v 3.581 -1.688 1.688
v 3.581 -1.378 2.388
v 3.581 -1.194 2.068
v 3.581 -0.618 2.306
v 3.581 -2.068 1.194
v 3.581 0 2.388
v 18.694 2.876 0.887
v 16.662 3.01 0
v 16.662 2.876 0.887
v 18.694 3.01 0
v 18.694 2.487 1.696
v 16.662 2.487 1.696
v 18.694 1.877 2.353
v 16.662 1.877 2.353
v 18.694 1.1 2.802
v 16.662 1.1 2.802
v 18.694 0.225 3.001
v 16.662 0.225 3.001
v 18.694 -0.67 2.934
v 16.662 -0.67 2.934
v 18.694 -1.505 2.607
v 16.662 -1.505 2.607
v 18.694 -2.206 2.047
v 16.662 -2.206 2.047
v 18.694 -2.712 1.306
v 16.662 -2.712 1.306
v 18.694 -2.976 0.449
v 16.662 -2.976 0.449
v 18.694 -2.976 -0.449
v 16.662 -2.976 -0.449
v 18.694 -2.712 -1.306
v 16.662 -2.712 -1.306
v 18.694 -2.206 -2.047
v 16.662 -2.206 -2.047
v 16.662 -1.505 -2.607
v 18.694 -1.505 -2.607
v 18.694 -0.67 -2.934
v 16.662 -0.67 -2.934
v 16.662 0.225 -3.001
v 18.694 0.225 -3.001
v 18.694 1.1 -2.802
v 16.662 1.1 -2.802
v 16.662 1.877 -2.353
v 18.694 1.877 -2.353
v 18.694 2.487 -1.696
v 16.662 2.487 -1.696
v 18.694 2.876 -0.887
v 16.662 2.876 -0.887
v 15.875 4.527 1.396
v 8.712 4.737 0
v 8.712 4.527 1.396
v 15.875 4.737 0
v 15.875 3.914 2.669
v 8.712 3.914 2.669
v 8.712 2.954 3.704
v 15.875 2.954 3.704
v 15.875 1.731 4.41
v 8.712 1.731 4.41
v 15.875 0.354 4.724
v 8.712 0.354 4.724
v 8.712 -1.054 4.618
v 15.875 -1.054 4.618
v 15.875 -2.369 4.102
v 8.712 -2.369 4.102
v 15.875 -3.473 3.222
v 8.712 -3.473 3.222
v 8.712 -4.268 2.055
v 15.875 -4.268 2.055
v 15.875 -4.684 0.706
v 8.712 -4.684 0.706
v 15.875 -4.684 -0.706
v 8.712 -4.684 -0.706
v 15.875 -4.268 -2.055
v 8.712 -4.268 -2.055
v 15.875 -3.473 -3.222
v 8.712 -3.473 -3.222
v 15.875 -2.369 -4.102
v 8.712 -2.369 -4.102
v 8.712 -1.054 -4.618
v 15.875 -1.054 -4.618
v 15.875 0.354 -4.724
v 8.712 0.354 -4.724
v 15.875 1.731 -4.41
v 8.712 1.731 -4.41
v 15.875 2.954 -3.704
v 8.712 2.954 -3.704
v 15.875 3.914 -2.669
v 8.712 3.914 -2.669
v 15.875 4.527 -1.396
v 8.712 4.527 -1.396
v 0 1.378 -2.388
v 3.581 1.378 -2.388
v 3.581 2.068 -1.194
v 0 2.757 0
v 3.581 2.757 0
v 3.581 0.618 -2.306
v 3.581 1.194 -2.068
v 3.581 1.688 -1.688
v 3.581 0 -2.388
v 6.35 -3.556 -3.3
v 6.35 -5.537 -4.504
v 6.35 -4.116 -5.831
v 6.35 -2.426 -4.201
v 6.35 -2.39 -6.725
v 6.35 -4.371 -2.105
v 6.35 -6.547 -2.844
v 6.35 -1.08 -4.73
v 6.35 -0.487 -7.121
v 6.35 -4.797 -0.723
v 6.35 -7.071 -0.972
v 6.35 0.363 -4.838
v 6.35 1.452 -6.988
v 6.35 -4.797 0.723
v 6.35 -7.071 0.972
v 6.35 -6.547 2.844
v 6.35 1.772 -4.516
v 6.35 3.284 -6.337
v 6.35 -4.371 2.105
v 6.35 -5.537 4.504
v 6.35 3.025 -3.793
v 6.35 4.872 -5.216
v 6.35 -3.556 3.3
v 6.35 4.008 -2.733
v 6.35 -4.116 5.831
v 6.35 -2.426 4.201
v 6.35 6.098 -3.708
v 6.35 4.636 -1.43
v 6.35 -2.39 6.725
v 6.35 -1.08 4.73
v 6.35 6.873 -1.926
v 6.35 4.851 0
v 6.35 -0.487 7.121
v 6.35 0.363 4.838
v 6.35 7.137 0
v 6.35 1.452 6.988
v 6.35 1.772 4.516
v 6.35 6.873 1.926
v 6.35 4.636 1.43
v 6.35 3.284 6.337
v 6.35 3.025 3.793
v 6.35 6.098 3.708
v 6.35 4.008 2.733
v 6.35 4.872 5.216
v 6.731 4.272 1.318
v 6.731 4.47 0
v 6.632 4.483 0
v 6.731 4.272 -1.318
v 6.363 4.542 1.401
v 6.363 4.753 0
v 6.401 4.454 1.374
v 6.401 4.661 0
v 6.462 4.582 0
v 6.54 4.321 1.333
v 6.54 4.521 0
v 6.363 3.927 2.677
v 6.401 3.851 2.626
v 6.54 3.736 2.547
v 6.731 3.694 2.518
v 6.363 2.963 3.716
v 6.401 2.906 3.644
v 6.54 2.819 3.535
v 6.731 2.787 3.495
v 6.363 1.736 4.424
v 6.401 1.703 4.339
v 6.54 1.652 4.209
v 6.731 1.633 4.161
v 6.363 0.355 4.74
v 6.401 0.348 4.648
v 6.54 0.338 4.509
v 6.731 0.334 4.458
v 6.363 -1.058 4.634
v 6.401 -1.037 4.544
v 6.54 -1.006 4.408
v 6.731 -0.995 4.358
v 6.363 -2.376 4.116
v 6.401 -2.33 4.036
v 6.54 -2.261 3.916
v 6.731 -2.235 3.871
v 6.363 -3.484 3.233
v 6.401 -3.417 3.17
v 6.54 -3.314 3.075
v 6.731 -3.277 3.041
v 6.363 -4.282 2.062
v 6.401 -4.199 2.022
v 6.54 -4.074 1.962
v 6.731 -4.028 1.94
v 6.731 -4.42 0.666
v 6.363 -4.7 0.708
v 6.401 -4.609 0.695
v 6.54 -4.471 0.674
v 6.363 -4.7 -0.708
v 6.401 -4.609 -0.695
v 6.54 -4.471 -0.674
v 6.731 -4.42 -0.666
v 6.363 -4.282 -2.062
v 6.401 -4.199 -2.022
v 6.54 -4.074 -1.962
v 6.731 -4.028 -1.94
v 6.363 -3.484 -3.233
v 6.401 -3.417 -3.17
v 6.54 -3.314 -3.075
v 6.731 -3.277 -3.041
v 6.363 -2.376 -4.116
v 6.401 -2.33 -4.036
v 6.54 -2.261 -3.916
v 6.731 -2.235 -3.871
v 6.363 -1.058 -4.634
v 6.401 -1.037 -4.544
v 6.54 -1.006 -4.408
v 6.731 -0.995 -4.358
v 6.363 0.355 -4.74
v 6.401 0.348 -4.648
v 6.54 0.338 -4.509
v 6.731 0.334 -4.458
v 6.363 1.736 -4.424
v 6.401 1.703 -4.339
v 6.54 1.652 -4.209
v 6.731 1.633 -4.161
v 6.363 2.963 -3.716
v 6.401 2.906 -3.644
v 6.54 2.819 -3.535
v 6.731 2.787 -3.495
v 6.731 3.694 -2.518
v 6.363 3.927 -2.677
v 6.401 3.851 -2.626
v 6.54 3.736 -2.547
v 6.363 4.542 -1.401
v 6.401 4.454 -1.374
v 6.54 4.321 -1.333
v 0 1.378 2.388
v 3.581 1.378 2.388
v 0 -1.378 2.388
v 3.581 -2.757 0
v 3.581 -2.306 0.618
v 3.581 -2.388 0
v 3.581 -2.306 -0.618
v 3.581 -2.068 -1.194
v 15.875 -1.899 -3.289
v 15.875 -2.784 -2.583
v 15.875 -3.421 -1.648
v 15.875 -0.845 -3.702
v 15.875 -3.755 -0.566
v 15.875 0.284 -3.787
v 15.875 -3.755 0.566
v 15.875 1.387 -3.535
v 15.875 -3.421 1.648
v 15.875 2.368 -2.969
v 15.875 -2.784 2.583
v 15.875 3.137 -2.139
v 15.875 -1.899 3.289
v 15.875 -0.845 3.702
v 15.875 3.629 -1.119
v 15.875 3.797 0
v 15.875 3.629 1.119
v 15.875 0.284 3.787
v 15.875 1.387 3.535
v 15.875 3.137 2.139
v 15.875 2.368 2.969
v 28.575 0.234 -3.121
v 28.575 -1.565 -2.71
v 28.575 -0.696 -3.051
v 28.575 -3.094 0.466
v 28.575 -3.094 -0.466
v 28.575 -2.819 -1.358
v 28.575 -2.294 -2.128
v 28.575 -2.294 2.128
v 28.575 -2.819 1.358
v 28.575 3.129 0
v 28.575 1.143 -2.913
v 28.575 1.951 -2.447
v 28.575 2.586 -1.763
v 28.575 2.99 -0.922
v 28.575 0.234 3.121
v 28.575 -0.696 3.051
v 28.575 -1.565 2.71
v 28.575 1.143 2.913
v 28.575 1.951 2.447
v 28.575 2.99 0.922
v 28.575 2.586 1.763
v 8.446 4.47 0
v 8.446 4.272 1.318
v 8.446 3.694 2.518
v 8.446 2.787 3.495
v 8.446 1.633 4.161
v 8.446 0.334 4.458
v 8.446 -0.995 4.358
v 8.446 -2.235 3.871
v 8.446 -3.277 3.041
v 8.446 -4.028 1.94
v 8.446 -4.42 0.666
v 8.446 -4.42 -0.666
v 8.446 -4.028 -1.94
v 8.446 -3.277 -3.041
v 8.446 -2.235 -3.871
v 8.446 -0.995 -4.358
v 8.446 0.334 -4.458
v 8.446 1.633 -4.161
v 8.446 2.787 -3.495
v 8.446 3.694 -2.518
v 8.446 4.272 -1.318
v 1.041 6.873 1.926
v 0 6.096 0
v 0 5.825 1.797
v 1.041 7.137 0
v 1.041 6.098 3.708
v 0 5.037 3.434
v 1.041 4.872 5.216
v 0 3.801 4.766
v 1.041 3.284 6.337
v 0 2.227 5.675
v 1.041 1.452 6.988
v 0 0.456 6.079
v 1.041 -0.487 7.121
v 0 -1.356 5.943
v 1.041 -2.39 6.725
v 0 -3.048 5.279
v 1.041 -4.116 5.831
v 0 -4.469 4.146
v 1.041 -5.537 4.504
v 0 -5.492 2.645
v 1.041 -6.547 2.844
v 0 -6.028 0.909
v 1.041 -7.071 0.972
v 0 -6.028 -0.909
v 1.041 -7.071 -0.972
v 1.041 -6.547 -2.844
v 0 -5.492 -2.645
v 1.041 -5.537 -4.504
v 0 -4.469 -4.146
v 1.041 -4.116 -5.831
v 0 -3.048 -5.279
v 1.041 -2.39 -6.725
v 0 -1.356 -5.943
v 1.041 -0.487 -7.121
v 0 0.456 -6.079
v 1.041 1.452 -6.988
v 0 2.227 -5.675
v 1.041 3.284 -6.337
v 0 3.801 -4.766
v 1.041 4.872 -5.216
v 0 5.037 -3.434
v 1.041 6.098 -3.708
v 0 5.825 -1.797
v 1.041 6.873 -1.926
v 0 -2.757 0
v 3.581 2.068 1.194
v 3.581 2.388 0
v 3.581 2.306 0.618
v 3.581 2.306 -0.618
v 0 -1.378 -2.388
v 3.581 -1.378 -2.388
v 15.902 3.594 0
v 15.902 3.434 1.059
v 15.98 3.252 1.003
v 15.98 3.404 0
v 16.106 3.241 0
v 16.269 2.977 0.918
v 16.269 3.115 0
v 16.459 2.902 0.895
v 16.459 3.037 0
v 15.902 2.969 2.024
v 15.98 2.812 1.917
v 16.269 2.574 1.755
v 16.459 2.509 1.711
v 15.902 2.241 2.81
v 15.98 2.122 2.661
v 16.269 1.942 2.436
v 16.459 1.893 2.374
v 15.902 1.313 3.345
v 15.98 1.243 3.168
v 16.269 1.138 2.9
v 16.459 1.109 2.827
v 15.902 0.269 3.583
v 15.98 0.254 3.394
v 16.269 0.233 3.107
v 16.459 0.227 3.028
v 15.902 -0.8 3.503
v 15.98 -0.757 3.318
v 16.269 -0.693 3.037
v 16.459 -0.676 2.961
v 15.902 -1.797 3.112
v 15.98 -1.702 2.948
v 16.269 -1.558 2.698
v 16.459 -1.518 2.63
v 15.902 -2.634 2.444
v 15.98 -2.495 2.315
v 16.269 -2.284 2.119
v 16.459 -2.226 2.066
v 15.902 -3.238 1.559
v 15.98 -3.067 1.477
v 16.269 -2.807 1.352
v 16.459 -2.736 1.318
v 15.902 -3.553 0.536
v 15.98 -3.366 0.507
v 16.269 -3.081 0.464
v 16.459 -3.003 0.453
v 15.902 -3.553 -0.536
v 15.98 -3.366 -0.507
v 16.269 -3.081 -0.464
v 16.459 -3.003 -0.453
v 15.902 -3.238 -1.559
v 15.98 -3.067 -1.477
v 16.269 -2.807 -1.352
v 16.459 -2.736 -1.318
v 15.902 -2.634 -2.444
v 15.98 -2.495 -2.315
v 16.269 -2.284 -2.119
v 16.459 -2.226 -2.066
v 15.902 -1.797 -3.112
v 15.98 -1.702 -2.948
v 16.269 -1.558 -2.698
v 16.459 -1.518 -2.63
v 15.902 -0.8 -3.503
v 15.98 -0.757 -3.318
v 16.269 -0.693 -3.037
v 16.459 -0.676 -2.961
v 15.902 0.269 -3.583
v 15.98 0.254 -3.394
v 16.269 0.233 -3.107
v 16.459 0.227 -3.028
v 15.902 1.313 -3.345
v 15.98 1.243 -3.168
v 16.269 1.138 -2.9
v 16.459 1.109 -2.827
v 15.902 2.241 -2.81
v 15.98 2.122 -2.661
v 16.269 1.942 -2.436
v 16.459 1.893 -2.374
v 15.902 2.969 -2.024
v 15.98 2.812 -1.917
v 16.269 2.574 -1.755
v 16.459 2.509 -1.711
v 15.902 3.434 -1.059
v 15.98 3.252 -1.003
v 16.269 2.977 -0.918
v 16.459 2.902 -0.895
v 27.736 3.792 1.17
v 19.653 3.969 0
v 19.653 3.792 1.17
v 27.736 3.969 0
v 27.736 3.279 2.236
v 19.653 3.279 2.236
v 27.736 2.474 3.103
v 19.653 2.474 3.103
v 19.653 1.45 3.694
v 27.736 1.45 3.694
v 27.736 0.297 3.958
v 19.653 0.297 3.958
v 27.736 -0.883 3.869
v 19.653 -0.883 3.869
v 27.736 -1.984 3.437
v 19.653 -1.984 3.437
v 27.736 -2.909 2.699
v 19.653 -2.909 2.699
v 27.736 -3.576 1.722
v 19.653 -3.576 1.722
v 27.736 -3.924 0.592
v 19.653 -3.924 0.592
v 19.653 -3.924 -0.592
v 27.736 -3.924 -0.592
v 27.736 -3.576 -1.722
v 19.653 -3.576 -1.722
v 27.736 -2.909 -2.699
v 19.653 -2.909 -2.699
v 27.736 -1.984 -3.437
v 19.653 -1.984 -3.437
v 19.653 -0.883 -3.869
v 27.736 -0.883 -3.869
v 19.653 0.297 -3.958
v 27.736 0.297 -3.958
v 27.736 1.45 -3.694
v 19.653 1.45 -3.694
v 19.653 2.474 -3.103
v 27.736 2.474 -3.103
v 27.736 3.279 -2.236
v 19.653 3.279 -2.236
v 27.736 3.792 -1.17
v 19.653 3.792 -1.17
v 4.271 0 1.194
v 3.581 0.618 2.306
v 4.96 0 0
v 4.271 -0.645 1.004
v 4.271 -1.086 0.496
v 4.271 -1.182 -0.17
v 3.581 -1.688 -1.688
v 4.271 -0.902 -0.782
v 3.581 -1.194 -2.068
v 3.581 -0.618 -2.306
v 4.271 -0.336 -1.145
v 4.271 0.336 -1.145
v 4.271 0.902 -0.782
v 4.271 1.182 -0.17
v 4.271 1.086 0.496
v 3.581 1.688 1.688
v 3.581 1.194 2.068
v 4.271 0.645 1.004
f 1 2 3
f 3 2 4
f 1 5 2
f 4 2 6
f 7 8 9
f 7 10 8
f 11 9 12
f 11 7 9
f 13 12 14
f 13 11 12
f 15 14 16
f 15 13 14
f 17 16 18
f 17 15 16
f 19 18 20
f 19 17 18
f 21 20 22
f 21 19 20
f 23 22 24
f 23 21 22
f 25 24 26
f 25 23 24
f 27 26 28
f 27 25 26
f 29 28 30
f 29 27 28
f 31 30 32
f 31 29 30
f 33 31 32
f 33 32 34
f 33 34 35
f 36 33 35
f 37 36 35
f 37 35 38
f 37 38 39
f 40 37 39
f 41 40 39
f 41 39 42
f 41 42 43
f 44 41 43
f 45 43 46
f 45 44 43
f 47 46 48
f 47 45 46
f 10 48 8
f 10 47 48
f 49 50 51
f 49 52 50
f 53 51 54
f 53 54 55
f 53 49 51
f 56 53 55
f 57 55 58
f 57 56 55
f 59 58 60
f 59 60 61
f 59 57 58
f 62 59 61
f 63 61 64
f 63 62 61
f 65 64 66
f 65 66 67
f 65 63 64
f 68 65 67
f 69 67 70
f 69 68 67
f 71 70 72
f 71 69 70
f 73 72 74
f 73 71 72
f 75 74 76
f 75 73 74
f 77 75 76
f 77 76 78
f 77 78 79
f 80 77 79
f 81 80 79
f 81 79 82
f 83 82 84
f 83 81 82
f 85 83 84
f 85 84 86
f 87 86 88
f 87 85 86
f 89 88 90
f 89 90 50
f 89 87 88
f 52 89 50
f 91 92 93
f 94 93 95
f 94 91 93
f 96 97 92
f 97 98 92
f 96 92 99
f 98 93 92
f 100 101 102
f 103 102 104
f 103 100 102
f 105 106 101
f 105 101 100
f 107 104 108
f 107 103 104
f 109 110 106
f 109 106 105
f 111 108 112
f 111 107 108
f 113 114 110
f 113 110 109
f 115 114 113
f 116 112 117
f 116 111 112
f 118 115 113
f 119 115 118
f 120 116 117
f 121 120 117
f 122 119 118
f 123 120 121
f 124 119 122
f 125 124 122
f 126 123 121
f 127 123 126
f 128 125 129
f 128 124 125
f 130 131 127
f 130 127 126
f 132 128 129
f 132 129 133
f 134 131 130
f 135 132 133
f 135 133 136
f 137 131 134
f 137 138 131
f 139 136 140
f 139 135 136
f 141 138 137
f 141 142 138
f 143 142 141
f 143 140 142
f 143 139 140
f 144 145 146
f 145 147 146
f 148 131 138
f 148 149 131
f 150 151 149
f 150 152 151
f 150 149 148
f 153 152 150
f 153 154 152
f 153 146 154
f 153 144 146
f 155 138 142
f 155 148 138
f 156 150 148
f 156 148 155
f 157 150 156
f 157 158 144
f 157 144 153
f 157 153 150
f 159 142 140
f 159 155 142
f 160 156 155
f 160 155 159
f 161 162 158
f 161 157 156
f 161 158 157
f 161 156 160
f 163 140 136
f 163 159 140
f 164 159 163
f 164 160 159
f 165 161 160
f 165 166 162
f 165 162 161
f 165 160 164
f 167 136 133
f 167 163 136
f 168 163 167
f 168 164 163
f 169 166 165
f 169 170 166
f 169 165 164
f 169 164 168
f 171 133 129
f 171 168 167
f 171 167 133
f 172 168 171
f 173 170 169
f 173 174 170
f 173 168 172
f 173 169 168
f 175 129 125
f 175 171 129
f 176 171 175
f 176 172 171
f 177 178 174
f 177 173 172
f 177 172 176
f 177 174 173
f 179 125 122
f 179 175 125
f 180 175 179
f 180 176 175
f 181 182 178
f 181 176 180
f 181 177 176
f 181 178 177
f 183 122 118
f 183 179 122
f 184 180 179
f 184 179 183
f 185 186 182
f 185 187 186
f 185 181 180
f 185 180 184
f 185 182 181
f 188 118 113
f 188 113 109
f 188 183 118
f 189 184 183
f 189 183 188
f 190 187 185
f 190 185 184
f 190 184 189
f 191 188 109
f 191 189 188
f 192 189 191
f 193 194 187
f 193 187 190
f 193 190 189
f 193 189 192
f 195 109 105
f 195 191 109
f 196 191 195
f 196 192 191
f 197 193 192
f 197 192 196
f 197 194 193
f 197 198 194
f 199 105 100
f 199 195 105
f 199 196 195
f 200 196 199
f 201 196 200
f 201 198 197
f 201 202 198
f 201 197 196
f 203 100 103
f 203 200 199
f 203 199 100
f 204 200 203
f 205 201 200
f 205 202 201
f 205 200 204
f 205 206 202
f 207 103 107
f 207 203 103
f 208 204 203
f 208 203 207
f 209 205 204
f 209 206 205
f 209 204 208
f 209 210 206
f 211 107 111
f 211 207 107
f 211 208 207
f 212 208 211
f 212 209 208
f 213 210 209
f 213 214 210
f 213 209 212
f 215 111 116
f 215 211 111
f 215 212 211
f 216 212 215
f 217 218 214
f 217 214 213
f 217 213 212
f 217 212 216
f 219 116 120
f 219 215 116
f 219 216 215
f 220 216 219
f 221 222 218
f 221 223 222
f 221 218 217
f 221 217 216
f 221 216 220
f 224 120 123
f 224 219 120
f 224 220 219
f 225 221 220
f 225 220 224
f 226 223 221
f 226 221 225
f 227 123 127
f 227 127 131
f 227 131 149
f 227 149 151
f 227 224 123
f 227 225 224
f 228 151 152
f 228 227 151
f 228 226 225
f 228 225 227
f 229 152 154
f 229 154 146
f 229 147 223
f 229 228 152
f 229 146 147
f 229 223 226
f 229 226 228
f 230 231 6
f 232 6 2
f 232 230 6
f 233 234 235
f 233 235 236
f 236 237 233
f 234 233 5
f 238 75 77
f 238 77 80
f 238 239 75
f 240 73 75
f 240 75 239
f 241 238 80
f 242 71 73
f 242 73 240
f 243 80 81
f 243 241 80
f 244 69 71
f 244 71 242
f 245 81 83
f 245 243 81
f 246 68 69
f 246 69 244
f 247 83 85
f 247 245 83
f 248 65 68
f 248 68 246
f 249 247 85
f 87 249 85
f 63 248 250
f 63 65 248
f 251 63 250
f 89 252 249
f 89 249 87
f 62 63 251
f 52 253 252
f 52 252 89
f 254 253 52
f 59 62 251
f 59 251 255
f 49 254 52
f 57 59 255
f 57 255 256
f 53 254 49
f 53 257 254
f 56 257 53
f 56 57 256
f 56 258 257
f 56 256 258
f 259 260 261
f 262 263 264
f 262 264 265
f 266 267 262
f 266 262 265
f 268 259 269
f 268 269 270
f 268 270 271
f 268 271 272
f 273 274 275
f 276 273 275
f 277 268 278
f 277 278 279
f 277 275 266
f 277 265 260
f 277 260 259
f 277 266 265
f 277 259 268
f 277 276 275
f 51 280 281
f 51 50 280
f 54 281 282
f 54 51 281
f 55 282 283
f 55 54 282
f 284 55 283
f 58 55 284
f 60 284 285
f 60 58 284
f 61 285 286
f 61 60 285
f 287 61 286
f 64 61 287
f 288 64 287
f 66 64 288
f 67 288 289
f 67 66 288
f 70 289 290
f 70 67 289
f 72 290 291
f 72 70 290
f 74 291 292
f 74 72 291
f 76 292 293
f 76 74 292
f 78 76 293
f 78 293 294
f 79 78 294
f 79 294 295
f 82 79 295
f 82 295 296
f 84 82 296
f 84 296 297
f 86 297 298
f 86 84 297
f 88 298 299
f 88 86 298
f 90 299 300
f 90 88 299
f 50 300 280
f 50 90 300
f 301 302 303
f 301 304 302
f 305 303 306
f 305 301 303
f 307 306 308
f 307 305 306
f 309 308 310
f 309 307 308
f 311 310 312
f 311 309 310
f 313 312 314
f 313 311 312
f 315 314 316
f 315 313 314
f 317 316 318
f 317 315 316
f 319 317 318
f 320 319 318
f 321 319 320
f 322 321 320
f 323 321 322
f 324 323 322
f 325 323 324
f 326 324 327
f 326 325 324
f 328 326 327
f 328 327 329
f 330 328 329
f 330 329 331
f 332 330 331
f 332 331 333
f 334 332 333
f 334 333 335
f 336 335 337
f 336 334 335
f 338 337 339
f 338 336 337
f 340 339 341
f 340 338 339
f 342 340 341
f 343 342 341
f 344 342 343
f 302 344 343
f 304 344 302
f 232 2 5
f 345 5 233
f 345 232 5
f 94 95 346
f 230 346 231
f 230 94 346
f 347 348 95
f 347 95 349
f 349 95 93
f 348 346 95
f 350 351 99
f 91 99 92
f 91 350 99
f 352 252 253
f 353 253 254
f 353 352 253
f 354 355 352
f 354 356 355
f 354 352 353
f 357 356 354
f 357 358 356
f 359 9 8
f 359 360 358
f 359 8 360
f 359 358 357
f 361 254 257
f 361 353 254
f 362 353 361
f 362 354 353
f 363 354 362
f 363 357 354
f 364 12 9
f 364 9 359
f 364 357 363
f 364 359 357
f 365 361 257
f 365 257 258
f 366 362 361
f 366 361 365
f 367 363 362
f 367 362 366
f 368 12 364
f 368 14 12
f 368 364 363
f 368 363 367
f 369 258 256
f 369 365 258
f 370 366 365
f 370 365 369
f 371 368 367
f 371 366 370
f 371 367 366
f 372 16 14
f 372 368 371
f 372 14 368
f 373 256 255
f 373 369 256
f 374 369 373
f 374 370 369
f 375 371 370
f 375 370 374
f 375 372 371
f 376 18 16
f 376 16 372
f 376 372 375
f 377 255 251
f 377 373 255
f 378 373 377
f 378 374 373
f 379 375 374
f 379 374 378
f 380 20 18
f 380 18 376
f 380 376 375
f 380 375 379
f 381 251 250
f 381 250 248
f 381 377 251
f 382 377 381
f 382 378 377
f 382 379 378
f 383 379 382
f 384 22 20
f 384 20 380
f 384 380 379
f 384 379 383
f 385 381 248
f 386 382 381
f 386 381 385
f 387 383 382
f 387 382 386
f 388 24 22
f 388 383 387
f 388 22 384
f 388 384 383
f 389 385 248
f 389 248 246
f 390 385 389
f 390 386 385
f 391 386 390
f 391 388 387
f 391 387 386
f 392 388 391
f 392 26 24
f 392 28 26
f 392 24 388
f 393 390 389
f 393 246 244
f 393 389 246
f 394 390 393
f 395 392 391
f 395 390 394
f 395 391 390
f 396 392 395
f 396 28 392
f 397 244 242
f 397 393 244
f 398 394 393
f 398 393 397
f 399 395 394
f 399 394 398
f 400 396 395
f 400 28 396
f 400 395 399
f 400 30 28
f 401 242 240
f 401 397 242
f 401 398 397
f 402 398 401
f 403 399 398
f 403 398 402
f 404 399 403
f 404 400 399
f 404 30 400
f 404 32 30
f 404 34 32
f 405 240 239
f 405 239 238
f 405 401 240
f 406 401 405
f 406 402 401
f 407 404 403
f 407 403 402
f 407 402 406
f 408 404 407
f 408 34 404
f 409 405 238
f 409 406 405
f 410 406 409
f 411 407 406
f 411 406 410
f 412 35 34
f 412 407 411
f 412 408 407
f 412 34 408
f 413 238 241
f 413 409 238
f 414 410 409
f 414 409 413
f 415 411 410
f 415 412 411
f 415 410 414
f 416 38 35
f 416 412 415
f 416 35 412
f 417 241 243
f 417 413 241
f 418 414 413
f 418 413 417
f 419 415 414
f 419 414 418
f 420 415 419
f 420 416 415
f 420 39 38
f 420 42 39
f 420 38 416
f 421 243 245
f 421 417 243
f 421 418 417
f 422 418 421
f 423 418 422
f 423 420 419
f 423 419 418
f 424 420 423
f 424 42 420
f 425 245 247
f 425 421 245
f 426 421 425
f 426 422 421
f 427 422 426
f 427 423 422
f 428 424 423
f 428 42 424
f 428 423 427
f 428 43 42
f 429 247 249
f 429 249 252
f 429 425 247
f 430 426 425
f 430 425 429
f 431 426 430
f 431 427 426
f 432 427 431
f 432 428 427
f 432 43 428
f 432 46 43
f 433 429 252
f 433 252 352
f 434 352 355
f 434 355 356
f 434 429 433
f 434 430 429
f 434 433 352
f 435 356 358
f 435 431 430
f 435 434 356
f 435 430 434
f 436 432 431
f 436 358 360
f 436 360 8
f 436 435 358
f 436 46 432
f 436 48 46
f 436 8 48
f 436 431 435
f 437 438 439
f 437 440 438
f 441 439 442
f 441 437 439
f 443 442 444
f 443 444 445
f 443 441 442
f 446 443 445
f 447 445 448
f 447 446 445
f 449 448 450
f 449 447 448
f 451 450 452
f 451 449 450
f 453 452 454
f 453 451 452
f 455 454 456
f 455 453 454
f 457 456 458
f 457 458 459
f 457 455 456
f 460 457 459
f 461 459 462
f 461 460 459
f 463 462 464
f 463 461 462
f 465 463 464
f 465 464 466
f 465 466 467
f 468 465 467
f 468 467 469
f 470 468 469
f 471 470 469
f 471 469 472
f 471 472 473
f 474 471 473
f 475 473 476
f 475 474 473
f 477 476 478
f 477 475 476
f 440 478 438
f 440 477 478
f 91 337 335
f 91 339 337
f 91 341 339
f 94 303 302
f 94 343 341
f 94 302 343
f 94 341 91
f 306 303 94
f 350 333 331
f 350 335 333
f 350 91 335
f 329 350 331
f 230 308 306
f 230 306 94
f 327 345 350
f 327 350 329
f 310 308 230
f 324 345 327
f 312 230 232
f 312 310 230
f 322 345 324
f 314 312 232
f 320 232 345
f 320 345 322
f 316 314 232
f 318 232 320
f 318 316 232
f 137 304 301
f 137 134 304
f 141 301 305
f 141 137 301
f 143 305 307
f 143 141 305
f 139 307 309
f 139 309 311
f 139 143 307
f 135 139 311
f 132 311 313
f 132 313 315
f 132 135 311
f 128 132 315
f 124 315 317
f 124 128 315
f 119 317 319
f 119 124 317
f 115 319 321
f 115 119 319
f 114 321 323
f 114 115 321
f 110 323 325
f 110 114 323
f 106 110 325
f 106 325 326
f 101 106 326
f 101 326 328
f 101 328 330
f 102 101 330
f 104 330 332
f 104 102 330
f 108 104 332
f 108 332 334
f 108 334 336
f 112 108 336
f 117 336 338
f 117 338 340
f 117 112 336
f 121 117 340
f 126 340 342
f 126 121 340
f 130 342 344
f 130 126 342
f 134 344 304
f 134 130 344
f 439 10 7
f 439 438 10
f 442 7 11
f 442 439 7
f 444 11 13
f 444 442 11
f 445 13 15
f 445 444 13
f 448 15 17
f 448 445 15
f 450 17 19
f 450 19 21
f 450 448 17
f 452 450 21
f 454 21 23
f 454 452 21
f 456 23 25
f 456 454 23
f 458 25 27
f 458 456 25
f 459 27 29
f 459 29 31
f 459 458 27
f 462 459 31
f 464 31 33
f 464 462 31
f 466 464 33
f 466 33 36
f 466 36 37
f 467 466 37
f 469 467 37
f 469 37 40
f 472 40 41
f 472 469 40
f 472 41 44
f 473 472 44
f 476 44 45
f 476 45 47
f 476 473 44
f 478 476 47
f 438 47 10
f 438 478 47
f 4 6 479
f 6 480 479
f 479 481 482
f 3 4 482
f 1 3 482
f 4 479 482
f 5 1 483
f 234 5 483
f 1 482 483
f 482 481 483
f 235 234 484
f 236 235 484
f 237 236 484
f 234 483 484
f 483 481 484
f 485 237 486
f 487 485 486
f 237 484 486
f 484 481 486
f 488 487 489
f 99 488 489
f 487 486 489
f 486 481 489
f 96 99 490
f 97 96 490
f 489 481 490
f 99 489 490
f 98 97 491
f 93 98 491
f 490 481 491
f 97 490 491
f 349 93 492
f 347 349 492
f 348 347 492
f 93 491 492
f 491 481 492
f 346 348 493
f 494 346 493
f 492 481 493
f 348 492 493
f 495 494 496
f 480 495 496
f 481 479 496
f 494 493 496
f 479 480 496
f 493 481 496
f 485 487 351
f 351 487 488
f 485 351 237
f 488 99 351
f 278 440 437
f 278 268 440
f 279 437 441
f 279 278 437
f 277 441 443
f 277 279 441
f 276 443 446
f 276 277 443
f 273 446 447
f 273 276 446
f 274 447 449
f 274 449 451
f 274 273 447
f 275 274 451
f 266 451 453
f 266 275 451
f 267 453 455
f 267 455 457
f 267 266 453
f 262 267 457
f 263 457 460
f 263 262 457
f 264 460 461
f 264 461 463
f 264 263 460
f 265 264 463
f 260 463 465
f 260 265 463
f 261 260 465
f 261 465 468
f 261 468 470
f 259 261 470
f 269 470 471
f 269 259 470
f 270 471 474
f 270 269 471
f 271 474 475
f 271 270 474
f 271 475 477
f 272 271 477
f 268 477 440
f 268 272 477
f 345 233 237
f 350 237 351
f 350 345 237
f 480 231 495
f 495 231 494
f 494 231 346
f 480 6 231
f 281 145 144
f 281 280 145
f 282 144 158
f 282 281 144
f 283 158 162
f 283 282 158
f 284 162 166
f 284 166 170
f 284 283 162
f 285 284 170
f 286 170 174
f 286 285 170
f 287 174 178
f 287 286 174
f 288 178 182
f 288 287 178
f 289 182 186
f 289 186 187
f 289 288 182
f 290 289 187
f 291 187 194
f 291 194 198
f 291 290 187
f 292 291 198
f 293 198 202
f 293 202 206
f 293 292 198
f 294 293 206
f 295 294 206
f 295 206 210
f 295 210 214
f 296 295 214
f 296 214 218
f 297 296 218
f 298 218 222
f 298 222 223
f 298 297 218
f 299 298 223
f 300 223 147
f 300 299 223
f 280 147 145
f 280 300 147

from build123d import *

# Parameters (mm, degrees)
HEX_2_DEPTH = 3.5814


# Read off the part's stored shape, not the designer's step: ThreadSchematic
with BuildPart() as part:
    # ThreadSchematic outline → ThreadSchematic (revolve)
    with BuildSketch(Plane.YX):
        with BuildLine():
            Line((0, 28.575), (0, 0))
            Line((0, 0), (6.096, 0))
            Line((6.096, 0), (7.1374, 1.0414))
            Line((7.1374, 1.0414), (7.1374, 6.35))
            Line((7.1374, 6.35), (4.8514, 6.35))
            ThreePointArc((4.8514, 6.35), (4.581992316, 6.461592316), (4.4704, 6.731))
            Line((4.4704, 6.731), (4.4704, 8.4455))
            Line((4.4704, 8.4455), (4.7371, 8.7122))
            Line((4.7371, 8.7122), (4.7371, 15.875))
            Line((4.7371, 15.875), (3.7973, 15.875))
            ThreePointArc((3.7973, 15.875), (3.24052412, 16.10562412), (3.0099, 16.6624))
            Line((3.0099, 16.6624), (3.0099, 18.6944))
            Line((3.0099, 18.6944), (3.96875, 19.65325))
            Line((3.96875, 19.65325), (3.96875, 27.73553))
            Line((3.96875, 27.73553), (3.12928, 28.575))
            Line((3.12928, 28.575), (0, 28.575))
        make_face()
    revolve(axis=Axis((0, 0, 0), (1, 0, 0)))

    # Sketch2 → PreBroach (revolve, cut)
    with BuildSketch(Plane.XY, mode=Mode.PRIVATE) as prebroach_sk:
        Polygon((0, 2.3876), (3.5814, 2.3876), (4.959881503, 0), (0, 0), align=None)
    revolve(prebroach_sk.sketch.rotate(Axis((0, 0, 0), (1, 0, 0)), 90), axis=Axis((0, 0, 0), (1, 0, 0)), mode=Mode.SUBTRACT)

    # Sketch3 → Hex 2 (cut)
    with BuildSketch(Plane.ZY):
        Polygon((-2.3876, -1.378481503), (-2.3876, 1.378481503), (0, 2.756963005), (2.3876, 1.378481503), (2.3876, -1.378481503), (0, -2.756963005), align=None)
    extrude(amount=-HEX_2_DEPTH, mode=Mode.SUBTRACT)


solid = part.part
